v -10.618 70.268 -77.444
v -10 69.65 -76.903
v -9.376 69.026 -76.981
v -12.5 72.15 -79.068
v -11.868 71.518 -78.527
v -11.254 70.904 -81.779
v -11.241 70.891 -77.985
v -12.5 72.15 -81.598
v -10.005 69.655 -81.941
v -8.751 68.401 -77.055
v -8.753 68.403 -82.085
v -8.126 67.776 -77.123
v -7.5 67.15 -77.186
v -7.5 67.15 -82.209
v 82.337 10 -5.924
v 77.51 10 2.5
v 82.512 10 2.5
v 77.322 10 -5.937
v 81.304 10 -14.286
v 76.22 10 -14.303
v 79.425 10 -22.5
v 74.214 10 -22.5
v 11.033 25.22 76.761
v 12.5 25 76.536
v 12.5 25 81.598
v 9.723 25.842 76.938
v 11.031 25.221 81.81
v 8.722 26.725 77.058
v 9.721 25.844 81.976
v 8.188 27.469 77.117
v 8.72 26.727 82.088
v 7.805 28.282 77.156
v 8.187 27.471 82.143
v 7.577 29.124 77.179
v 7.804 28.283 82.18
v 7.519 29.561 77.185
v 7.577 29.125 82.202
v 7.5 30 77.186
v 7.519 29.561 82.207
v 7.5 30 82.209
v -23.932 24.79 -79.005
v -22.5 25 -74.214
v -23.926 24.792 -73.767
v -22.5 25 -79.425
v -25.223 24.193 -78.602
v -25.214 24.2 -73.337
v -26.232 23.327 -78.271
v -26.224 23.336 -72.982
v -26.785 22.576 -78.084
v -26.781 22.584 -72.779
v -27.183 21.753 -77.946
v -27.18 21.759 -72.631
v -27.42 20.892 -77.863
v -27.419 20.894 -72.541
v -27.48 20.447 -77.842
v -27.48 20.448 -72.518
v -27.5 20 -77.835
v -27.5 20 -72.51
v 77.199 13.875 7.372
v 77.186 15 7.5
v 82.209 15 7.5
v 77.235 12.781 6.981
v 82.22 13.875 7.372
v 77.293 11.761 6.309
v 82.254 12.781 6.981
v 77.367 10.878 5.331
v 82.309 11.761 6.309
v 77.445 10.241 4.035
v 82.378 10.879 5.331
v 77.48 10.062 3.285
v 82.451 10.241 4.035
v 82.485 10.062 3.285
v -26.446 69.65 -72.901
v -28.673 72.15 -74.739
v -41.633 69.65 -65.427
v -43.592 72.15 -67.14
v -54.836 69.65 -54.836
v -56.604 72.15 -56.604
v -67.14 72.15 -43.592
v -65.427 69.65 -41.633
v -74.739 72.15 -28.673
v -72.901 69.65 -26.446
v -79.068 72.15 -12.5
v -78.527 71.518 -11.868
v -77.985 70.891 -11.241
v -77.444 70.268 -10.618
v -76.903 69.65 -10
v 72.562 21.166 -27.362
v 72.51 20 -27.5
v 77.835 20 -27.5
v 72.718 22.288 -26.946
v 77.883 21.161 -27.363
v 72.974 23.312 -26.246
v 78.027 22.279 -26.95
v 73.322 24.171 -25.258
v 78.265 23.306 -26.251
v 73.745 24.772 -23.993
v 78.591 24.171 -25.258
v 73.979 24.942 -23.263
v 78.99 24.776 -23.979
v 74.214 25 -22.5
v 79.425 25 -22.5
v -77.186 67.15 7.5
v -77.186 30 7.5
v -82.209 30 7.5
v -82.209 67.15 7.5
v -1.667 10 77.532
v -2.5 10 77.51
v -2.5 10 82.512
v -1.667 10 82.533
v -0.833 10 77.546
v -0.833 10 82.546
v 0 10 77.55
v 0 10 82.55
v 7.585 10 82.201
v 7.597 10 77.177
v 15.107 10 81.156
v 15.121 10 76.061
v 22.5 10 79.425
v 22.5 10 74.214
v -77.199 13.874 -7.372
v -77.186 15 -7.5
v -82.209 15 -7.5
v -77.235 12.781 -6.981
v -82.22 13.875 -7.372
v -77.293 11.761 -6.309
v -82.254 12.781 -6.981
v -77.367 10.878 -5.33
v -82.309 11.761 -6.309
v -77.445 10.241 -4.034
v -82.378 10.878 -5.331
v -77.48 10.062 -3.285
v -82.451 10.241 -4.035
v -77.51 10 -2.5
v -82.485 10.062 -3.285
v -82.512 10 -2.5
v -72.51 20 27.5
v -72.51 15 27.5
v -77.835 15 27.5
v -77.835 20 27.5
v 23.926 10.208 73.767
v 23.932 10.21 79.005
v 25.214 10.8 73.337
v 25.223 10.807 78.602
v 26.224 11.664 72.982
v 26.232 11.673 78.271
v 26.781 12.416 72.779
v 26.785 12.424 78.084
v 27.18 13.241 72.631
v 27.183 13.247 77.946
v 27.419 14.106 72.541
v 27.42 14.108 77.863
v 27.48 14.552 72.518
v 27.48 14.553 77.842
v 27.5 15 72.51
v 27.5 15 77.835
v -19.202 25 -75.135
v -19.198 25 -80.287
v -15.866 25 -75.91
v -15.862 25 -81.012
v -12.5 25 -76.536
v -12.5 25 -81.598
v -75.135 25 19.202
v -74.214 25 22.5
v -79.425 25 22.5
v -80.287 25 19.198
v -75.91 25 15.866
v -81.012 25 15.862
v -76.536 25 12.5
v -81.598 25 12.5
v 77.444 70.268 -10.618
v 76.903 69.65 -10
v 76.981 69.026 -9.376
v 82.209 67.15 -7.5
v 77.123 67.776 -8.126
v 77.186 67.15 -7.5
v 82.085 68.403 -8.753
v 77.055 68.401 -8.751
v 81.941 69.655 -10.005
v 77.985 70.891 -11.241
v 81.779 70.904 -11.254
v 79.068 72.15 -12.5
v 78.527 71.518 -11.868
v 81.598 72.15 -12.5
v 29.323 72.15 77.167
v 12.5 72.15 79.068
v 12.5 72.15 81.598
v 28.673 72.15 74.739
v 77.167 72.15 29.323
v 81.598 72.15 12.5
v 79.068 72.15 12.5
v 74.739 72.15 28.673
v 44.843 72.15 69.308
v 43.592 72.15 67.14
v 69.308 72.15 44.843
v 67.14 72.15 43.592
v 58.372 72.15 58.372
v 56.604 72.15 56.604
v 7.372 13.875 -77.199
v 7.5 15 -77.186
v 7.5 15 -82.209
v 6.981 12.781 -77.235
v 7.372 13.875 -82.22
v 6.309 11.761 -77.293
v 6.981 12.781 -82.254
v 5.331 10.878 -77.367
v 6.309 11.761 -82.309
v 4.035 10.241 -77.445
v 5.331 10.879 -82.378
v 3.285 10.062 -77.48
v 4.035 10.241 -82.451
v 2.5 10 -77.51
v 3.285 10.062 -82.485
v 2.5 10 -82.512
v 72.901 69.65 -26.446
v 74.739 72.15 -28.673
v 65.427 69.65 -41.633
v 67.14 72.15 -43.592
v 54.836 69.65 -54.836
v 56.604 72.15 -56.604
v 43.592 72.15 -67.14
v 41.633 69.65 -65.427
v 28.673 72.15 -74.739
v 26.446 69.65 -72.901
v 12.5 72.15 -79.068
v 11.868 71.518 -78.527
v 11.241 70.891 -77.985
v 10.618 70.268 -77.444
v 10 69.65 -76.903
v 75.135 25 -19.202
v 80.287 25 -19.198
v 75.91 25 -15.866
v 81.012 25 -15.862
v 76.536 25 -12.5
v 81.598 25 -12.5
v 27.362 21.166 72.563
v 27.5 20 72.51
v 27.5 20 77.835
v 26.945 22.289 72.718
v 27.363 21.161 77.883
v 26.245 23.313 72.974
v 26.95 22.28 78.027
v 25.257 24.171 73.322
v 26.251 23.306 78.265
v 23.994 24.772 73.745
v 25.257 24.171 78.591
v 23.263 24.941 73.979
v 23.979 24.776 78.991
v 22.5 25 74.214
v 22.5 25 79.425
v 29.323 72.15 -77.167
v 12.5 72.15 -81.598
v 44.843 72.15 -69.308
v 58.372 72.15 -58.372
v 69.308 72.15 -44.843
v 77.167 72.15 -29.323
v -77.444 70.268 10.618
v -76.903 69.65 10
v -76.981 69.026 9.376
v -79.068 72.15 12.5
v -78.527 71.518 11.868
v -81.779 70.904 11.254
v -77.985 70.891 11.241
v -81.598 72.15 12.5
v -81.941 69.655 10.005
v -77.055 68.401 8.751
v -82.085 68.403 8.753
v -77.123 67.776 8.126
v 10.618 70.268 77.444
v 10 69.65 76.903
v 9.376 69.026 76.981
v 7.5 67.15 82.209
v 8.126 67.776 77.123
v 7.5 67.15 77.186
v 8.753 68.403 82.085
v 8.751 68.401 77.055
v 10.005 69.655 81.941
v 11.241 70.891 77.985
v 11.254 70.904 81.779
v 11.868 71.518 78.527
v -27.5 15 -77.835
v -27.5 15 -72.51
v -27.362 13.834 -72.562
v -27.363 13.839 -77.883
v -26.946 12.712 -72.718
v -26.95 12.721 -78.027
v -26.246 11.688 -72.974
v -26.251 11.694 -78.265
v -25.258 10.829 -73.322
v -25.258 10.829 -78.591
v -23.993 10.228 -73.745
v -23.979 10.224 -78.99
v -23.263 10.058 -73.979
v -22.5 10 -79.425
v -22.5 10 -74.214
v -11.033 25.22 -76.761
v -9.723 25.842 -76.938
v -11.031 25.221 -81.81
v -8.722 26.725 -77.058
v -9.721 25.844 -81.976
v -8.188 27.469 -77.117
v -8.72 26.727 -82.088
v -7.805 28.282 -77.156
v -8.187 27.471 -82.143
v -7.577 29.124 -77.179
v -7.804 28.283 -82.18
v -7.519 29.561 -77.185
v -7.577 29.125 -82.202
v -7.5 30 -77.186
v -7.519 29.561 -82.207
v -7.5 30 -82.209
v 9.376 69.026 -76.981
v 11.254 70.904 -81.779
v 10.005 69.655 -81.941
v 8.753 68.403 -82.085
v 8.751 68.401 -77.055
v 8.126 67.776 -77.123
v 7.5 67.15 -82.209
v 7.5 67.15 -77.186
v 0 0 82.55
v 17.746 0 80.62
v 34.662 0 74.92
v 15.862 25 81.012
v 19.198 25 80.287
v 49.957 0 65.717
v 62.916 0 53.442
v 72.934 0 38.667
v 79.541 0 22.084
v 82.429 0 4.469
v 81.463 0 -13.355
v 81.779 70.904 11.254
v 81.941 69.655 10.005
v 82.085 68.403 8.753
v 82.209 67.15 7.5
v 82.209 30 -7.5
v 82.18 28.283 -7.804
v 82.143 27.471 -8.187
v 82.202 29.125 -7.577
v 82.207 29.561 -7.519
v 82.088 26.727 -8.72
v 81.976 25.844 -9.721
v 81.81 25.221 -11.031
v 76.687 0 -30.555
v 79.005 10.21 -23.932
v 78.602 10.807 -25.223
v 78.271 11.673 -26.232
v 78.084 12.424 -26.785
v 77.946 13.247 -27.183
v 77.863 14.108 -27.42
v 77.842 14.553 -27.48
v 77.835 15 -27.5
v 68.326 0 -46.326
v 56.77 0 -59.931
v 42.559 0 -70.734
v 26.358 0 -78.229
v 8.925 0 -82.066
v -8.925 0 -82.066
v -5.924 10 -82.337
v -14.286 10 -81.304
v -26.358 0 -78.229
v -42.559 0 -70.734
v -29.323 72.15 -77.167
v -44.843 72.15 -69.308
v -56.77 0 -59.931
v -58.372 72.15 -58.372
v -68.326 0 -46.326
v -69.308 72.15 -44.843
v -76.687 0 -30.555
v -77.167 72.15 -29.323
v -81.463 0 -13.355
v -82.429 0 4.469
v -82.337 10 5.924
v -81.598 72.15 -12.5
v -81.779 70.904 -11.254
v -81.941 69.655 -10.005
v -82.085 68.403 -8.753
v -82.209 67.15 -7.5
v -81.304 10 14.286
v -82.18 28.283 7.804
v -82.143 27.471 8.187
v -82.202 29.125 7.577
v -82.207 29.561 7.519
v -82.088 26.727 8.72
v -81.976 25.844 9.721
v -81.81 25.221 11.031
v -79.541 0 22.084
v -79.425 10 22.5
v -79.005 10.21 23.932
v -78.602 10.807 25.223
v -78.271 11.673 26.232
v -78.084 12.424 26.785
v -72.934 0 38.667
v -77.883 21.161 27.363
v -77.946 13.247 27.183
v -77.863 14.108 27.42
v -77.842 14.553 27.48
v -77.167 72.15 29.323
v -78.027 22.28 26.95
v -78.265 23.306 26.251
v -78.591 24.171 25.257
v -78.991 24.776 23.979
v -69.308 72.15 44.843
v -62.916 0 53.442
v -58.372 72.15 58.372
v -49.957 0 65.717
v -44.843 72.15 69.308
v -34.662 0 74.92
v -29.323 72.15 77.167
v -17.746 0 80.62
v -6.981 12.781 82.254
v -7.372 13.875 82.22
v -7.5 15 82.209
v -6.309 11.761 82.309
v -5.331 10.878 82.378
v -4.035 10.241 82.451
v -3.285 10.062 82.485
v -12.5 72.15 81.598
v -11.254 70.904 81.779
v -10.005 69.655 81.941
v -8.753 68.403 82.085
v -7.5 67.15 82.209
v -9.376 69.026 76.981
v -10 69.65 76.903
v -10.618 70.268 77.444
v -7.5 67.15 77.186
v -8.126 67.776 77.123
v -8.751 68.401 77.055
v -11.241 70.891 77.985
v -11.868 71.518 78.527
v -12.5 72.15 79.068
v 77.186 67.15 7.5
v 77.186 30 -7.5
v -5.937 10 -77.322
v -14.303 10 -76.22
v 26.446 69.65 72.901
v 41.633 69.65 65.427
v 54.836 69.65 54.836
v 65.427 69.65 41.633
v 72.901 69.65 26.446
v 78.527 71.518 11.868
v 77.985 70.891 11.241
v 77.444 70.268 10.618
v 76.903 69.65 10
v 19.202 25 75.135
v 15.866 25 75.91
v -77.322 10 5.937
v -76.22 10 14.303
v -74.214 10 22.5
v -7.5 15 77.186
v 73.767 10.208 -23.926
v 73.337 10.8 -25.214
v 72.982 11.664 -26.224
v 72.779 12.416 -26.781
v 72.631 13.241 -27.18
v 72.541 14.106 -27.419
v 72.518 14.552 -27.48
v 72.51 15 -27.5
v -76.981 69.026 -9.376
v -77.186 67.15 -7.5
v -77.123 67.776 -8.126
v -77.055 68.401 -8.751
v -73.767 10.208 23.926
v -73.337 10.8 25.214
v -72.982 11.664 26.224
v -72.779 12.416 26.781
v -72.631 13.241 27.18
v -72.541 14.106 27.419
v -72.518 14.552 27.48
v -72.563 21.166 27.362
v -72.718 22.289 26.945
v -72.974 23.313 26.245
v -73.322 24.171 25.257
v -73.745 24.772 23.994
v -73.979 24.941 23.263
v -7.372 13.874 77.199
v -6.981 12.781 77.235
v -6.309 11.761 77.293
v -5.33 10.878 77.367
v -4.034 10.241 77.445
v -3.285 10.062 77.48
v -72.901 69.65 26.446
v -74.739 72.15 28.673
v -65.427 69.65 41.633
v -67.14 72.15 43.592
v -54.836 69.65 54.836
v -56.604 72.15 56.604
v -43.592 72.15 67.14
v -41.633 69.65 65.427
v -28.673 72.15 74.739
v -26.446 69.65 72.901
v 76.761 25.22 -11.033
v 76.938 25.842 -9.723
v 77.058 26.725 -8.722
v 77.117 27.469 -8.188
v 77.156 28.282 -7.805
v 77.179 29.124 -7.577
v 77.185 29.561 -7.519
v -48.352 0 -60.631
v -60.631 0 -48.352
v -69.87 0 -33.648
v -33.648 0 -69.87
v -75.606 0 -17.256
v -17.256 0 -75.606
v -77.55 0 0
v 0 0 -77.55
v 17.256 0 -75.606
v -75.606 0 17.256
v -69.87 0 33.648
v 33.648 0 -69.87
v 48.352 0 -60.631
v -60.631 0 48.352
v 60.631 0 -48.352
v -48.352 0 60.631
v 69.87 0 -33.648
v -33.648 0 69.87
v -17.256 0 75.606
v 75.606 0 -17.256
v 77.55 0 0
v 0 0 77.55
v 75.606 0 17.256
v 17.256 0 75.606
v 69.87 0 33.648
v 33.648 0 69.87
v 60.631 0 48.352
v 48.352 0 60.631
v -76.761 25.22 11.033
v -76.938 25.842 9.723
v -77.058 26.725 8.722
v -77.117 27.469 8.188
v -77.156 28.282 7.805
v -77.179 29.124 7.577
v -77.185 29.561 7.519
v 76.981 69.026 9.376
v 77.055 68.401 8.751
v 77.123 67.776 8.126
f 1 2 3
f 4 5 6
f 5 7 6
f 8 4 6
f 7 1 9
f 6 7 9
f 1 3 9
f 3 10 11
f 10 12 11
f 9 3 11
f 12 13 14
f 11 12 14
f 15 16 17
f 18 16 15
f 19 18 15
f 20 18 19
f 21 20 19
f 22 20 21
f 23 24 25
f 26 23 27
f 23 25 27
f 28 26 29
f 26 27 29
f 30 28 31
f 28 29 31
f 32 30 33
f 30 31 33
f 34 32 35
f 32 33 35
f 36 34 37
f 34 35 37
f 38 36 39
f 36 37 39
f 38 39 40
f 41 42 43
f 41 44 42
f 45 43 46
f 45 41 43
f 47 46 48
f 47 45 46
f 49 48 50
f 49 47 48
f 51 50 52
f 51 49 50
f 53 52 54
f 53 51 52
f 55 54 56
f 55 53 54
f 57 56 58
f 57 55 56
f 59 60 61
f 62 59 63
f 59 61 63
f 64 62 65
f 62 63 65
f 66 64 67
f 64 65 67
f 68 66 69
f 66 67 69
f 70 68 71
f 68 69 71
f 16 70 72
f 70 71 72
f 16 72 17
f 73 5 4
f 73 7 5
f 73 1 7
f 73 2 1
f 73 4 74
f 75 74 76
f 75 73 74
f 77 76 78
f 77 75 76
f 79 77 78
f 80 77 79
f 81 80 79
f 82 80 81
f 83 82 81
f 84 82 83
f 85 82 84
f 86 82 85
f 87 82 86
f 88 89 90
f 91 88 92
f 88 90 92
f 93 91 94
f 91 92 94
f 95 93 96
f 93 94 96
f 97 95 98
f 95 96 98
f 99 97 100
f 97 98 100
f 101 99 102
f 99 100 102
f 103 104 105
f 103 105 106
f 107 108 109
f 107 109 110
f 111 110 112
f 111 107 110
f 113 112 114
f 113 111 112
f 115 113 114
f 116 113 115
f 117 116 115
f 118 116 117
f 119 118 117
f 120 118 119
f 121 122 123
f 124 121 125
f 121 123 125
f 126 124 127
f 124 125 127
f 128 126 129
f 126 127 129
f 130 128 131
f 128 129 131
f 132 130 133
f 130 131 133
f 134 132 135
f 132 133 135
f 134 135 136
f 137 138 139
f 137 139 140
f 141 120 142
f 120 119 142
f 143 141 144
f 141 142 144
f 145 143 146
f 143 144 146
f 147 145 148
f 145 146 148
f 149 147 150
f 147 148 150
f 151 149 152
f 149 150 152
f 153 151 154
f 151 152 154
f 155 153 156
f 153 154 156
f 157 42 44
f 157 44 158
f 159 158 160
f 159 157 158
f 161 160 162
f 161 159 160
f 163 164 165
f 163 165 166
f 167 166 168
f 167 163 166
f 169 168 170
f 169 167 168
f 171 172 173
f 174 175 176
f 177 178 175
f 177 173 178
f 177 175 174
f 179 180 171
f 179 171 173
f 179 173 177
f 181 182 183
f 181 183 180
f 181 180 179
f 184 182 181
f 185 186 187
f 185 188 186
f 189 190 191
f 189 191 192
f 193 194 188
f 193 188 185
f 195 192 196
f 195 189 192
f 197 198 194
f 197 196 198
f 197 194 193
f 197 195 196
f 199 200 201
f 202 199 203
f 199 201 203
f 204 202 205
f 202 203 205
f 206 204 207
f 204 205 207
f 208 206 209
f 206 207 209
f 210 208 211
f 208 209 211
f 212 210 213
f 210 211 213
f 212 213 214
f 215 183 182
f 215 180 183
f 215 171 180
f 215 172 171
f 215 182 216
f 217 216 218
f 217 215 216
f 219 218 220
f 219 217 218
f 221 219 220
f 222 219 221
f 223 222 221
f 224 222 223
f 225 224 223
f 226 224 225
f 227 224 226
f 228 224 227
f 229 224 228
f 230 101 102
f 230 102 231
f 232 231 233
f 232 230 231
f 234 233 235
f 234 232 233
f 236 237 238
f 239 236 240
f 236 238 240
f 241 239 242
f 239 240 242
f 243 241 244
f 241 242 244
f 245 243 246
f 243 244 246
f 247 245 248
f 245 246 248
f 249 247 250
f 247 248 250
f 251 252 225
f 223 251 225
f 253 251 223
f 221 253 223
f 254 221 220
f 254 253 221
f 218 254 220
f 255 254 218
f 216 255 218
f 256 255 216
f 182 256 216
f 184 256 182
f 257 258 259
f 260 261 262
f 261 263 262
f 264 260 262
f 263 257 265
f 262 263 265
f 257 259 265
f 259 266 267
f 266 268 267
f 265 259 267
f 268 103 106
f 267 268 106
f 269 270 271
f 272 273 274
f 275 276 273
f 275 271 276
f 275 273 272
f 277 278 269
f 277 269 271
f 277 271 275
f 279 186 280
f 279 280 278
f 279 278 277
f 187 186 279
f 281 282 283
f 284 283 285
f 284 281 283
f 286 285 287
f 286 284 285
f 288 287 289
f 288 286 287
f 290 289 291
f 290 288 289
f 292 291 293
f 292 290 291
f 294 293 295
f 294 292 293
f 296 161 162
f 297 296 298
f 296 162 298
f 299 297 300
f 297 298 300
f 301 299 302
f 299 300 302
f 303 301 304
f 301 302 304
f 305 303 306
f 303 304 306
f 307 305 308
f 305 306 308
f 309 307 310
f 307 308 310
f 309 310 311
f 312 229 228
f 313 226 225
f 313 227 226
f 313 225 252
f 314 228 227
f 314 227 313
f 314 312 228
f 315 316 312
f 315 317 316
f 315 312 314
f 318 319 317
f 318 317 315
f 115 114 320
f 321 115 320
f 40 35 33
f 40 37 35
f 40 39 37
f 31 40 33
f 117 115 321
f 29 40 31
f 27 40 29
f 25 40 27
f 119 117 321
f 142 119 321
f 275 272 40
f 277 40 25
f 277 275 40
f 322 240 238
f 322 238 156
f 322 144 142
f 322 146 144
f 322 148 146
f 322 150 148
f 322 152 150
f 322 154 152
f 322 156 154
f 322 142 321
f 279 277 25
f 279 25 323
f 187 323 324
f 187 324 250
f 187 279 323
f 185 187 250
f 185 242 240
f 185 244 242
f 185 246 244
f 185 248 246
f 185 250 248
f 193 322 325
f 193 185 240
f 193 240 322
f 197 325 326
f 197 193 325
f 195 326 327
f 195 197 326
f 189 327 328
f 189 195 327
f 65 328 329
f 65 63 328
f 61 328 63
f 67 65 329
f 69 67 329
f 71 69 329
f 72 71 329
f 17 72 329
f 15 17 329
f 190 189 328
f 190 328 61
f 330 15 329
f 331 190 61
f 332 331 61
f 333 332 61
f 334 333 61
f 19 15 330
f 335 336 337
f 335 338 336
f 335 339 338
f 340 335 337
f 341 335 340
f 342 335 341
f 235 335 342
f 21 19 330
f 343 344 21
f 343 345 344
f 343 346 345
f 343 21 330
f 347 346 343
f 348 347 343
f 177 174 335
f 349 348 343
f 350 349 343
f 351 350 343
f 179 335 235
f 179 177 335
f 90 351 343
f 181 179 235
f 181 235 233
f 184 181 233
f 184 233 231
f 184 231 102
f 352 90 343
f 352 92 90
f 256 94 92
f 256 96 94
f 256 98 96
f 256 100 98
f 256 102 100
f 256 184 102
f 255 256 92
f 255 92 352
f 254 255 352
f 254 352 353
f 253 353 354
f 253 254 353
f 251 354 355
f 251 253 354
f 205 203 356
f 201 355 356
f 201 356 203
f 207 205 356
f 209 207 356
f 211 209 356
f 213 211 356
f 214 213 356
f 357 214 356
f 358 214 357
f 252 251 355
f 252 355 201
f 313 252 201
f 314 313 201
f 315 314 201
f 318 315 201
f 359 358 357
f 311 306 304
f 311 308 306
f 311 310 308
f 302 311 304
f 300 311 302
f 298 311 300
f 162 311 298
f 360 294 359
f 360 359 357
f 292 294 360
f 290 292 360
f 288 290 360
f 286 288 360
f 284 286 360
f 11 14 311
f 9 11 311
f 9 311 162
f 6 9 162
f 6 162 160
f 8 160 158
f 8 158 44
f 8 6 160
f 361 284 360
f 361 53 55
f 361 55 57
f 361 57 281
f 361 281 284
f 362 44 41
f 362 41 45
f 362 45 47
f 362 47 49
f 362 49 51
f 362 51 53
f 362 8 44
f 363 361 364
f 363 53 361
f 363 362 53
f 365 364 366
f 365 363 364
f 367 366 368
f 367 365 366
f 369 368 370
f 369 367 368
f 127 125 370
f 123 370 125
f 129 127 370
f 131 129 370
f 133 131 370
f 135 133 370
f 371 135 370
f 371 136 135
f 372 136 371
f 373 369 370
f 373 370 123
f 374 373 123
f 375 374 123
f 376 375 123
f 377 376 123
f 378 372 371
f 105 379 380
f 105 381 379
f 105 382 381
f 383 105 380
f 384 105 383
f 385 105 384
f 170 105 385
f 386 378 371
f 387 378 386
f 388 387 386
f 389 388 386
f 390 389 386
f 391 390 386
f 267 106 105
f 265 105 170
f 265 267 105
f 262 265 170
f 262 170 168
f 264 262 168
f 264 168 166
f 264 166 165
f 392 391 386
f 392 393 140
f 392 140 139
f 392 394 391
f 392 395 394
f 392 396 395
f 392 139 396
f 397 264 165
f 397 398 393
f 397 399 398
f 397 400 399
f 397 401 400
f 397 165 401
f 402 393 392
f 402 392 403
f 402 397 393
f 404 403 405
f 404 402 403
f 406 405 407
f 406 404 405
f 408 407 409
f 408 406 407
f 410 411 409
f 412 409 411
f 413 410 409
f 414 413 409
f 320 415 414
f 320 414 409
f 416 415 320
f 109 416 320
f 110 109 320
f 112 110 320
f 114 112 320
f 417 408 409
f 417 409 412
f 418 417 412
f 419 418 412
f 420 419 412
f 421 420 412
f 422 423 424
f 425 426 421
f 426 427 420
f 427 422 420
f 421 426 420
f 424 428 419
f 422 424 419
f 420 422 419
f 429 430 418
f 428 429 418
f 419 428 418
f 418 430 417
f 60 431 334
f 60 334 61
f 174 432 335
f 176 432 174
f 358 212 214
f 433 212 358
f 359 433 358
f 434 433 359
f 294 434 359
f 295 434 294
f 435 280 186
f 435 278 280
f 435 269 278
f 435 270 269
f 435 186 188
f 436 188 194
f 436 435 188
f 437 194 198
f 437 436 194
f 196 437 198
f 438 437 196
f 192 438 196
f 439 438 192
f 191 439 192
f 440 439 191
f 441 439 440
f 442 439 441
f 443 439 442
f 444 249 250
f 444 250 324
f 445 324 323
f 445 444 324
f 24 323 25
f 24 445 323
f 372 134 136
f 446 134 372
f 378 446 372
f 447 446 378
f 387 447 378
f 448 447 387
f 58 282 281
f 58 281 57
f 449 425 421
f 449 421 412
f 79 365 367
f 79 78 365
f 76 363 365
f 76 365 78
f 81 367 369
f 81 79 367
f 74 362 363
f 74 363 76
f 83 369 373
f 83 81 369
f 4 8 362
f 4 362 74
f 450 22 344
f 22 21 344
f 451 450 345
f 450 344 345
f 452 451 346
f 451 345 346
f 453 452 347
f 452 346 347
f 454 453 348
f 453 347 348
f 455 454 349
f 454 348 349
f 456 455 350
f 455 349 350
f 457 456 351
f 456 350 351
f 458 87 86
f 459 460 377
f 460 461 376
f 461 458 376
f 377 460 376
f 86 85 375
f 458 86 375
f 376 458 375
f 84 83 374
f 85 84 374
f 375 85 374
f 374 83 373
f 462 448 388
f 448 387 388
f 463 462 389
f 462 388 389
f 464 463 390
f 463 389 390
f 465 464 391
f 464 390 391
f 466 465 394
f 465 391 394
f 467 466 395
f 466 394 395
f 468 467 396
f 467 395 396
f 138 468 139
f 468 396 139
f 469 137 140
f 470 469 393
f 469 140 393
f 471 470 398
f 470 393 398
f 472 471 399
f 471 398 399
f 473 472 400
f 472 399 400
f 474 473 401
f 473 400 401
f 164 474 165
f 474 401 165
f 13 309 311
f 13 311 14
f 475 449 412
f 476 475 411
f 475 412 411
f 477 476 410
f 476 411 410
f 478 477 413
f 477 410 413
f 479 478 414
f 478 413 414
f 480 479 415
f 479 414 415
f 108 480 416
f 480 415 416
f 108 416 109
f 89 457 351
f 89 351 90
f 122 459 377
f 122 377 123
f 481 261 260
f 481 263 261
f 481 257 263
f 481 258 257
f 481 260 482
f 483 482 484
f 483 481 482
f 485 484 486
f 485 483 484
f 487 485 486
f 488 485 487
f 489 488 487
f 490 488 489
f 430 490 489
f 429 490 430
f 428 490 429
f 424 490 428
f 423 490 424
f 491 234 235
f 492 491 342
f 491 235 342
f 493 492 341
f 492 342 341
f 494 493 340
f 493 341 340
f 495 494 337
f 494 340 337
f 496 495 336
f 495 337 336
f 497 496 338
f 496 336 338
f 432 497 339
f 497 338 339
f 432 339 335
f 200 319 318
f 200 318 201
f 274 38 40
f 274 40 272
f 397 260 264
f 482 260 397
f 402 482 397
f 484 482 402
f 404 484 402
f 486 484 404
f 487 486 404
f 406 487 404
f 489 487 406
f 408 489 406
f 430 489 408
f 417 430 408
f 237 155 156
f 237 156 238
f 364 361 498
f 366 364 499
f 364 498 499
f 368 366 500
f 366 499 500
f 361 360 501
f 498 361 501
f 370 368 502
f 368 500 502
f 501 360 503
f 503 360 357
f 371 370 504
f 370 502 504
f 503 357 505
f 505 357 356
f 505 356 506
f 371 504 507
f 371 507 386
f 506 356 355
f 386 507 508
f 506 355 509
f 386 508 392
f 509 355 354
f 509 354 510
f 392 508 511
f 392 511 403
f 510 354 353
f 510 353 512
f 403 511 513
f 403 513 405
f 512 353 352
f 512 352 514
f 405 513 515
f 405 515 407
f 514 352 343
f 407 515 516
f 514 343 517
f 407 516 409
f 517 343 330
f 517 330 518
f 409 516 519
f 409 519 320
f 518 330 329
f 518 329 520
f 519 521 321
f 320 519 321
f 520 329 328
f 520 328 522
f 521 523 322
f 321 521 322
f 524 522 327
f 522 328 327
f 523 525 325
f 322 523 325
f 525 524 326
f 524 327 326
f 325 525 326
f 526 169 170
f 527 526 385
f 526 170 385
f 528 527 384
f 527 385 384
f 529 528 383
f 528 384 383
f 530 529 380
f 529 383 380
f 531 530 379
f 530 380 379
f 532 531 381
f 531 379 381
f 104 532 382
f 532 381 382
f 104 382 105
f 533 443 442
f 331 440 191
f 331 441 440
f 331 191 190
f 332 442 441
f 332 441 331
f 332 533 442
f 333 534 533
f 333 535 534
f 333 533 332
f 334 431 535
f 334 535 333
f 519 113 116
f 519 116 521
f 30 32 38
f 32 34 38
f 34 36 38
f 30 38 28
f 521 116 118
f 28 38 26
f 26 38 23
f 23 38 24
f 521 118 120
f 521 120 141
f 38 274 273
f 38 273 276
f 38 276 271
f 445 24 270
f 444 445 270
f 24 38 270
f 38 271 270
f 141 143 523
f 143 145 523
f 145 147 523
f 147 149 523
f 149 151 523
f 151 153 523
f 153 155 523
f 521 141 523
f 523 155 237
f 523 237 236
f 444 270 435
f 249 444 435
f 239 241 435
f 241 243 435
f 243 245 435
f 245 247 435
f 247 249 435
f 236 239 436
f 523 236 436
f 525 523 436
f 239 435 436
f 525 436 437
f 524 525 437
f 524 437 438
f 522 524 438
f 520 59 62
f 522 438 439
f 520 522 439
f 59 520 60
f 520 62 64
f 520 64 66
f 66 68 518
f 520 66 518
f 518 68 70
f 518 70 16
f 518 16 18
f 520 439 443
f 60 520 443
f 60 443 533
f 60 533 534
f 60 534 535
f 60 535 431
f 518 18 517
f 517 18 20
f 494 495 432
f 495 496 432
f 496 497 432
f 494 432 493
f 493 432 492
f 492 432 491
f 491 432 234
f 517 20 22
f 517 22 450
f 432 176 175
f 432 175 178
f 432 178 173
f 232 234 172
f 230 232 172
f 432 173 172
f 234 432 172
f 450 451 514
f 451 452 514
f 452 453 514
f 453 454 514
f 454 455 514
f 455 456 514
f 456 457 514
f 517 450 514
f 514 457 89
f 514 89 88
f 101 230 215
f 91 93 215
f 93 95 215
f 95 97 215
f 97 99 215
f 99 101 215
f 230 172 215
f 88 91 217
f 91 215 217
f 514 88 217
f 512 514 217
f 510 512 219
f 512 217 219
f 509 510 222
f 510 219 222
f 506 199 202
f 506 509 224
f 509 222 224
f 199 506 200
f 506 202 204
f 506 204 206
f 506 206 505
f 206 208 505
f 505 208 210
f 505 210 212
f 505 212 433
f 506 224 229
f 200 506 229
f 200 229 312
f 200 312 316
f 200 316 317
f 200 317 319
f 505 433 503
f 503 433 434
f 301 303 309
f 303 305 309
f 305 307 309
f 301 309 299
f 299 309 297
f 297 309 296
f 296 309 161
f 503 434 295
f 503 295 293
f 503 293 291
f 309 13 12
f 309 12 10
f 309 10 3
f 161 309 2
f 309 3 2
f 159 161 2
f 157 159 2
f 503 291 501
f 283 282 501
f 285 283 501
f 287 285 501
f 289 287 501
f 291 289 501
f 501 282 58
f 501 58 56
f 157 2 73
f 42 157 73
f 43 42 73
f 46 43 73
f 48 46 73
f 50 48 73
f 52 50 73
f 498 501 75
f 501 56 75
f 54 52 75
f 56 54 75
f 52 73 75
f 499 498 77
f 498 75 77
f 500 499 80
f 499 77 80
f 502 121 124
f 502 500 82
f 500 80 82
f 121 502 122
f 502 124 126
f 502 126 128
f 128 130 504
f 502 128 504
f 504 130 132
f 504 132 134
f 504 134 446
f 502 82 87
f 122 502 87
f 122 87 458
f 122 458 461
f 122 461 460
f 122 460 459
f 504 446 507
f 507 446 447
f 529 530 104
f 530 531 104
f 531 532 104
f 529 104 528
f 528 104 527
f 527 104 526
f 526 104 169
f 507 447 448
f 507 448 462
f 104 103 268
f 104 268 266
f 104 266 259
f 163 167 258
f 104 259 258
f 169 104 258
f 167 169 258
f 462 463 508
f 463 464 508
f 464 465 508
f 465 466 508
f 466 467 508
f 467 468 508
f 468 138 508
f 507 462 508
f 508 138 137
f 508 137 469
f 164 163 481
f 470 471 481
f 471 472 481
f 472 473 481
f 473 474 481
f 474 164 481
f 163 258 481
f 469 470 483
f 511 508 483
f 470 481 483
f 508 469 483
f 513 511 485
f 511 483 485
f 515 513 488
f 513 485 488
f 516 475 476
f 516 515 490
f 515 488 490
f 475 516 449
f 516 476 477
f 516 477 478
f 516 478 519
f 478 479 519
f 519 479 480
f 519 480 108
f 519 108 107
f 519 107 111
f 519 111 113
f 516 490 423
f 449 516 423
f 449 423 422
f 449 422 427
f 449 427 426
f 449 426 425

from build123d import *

# Parameters (mm, degrees)
SKETCH2_W                    = 5
SKETCH2_H                    = 72.15
CUT_EXTRUDE1_DEPTH           = 83.55
FILLET1_R                    = 5
CHAMFER1_SIZE                = 5
FILLET3_R                    = 5
CIRPATTERN1_COUNT            = 4
FILLET1_OF_CIRPATTERN1_R     = 5
CHAMFER1_OF_CIRPATTERN1_SIZE = 5
FILLET3_OF_CIRPATTERN1_R     = 5
CHAMFER2_SIZE                = 2.5


with BuildPart() as part:
    # Sketch2 → Revolve1 (revolve)
    with BuildSketch(Plane(origin=(0, 0, 0), x_dir=(0, 0, -1), z_dir=(1, 0, 0))):
        with Locations((-80.05, 36.075)):
            Rectangle(SKETCH2_W, SKETCH2_H)
    revolve(axis=Axis((0, -3.6075, 0), (0, 1, 0)))

    # Sketch3 → Cut-Extrude1 (cut, through all)
    with BuildSketch(Plane(origin=(0, 0, 0), x_dir=(0, 0, -1), z_dir=(1, 0, 0))):
        Polygon((-7.5, 72.15), (7.5, 72.15), (7.5, 10), (-27.5, 10), (-27.5, 25), (-7.5, 25), align=None)
    cut_extrude1 = extrude(amount=-CUT_EXTRUDE1_DEPTH, mode=Mode.SUBTRACT)

    # Fillet1
    fillet1_edges = [part.edges().sort_by_distance(p)[0] for p in [
        (-79.697535069, 10, -7.5),
        (-79.697535069, 25, 7.5),
    ]]
    fillet(fillet1_edges, radius=FILLET1_R)

    # Chamfer1
    chamfer1_edges = [part.edges().sort_by_distance(p)[0] for p in [
        (-79.697535069, 72.15, -7.5),
        (-79.697535069, 72.15, 7.5),
    ]]
    chamfer(chamfer1_edges, length=CHAMFER1_SIZE)

    # Fillet3
    fillet3_edges = [part.edges().sort_by_distance(p)[0] for p in [
        (-75.17256913, 10, 27.5),
        (-75.17256913, 25, 27.5),
    ]]
    fillet(fillet3_edges, radius=FILLET3_R)

    # CirPattern1: Cut-Extrude1 ×4 about axis
    cirpattern1_axis = Axis((0, 0, 0), (0, 1, 0))
    for i in range(1, CIRPATTERN1_COUNT):
        add(cut_extrude1.rotate(cirpattern1_axis, i * 360 / CIRPATTERN1_COUNT), mode=Mode.SUBTRACT)

    # Fillet1 of CirPattern1
    fillet1_of_cirpattern1_edges = [part.edges().sort_by_distance(p)[0] for p in [
        (-7.5, 10, 79.697535069),
        (7.5, 25, 79.697535069),
        (79.697535069, 10, 7.5),
        (79.697535069, 25, -7.5),
        (7.5, 10, -79.697535069),
        (-7.5, 25, -79.697535069),
    ]]
    fillet(fillet1_of_cirpattern1_edges, radius=FILLET1_OF_CIRPATTERN1_R)

    # Chamfer1 of CirPattern1
    chamfer1_of_cirpattern1_edges = [part.edges().sort_by_distance(p)[0] for p in [
        (-7.5, 72.15, 79.697535069),
        (7.5, 72.15, 79.697535069),
        (79.697535069, 72.15, 7.5),
        (79.697535069, 72.15, -7.5),
        (7.5, 72.15, -79.697535069),
        (-7.5, 72.15, -79.697535069),
    ]]
    chamfer(chamfer1_of_cirpattern1_edges, length=CHAMFER1_OF_CIRPATTERN1_SIZE)

    # Fillet3 of CirPattern1
    fillet3_of_cirpattern1_edges = [part.edges().sort_by_distance(p)[0] for p in [
        (27.5, 10, 75.17256913),
        (27.5, 25, 75.17256913),
        (75.17256913, 10, -27.5),
        (75.17256913, 25, -27.5),
        (-27.5, 10, -75.17256913),
        (-27.5, 25, -75.17256913),
    ]]
    fillet(fillet3_of_cirpattern1_edges, radius=FILLET3_OF_CIRPATTERN1_R)

    # Chamfer2
    chamfer2_edges = [part.edges().sort_by_distance(p)[0] for p in [
        (-54.836130881, 72.15, -54.836130881),
        (54.836130881, 72.15, -54.836130881),
        (54.836130881, 72.15, 54.836130881),
        (-54.836130881, 72.15, 54.836130881),
    ]]
    chamfer(chamfer2_edges, length=CHAMFER2_SIZE)


solid = part.part
